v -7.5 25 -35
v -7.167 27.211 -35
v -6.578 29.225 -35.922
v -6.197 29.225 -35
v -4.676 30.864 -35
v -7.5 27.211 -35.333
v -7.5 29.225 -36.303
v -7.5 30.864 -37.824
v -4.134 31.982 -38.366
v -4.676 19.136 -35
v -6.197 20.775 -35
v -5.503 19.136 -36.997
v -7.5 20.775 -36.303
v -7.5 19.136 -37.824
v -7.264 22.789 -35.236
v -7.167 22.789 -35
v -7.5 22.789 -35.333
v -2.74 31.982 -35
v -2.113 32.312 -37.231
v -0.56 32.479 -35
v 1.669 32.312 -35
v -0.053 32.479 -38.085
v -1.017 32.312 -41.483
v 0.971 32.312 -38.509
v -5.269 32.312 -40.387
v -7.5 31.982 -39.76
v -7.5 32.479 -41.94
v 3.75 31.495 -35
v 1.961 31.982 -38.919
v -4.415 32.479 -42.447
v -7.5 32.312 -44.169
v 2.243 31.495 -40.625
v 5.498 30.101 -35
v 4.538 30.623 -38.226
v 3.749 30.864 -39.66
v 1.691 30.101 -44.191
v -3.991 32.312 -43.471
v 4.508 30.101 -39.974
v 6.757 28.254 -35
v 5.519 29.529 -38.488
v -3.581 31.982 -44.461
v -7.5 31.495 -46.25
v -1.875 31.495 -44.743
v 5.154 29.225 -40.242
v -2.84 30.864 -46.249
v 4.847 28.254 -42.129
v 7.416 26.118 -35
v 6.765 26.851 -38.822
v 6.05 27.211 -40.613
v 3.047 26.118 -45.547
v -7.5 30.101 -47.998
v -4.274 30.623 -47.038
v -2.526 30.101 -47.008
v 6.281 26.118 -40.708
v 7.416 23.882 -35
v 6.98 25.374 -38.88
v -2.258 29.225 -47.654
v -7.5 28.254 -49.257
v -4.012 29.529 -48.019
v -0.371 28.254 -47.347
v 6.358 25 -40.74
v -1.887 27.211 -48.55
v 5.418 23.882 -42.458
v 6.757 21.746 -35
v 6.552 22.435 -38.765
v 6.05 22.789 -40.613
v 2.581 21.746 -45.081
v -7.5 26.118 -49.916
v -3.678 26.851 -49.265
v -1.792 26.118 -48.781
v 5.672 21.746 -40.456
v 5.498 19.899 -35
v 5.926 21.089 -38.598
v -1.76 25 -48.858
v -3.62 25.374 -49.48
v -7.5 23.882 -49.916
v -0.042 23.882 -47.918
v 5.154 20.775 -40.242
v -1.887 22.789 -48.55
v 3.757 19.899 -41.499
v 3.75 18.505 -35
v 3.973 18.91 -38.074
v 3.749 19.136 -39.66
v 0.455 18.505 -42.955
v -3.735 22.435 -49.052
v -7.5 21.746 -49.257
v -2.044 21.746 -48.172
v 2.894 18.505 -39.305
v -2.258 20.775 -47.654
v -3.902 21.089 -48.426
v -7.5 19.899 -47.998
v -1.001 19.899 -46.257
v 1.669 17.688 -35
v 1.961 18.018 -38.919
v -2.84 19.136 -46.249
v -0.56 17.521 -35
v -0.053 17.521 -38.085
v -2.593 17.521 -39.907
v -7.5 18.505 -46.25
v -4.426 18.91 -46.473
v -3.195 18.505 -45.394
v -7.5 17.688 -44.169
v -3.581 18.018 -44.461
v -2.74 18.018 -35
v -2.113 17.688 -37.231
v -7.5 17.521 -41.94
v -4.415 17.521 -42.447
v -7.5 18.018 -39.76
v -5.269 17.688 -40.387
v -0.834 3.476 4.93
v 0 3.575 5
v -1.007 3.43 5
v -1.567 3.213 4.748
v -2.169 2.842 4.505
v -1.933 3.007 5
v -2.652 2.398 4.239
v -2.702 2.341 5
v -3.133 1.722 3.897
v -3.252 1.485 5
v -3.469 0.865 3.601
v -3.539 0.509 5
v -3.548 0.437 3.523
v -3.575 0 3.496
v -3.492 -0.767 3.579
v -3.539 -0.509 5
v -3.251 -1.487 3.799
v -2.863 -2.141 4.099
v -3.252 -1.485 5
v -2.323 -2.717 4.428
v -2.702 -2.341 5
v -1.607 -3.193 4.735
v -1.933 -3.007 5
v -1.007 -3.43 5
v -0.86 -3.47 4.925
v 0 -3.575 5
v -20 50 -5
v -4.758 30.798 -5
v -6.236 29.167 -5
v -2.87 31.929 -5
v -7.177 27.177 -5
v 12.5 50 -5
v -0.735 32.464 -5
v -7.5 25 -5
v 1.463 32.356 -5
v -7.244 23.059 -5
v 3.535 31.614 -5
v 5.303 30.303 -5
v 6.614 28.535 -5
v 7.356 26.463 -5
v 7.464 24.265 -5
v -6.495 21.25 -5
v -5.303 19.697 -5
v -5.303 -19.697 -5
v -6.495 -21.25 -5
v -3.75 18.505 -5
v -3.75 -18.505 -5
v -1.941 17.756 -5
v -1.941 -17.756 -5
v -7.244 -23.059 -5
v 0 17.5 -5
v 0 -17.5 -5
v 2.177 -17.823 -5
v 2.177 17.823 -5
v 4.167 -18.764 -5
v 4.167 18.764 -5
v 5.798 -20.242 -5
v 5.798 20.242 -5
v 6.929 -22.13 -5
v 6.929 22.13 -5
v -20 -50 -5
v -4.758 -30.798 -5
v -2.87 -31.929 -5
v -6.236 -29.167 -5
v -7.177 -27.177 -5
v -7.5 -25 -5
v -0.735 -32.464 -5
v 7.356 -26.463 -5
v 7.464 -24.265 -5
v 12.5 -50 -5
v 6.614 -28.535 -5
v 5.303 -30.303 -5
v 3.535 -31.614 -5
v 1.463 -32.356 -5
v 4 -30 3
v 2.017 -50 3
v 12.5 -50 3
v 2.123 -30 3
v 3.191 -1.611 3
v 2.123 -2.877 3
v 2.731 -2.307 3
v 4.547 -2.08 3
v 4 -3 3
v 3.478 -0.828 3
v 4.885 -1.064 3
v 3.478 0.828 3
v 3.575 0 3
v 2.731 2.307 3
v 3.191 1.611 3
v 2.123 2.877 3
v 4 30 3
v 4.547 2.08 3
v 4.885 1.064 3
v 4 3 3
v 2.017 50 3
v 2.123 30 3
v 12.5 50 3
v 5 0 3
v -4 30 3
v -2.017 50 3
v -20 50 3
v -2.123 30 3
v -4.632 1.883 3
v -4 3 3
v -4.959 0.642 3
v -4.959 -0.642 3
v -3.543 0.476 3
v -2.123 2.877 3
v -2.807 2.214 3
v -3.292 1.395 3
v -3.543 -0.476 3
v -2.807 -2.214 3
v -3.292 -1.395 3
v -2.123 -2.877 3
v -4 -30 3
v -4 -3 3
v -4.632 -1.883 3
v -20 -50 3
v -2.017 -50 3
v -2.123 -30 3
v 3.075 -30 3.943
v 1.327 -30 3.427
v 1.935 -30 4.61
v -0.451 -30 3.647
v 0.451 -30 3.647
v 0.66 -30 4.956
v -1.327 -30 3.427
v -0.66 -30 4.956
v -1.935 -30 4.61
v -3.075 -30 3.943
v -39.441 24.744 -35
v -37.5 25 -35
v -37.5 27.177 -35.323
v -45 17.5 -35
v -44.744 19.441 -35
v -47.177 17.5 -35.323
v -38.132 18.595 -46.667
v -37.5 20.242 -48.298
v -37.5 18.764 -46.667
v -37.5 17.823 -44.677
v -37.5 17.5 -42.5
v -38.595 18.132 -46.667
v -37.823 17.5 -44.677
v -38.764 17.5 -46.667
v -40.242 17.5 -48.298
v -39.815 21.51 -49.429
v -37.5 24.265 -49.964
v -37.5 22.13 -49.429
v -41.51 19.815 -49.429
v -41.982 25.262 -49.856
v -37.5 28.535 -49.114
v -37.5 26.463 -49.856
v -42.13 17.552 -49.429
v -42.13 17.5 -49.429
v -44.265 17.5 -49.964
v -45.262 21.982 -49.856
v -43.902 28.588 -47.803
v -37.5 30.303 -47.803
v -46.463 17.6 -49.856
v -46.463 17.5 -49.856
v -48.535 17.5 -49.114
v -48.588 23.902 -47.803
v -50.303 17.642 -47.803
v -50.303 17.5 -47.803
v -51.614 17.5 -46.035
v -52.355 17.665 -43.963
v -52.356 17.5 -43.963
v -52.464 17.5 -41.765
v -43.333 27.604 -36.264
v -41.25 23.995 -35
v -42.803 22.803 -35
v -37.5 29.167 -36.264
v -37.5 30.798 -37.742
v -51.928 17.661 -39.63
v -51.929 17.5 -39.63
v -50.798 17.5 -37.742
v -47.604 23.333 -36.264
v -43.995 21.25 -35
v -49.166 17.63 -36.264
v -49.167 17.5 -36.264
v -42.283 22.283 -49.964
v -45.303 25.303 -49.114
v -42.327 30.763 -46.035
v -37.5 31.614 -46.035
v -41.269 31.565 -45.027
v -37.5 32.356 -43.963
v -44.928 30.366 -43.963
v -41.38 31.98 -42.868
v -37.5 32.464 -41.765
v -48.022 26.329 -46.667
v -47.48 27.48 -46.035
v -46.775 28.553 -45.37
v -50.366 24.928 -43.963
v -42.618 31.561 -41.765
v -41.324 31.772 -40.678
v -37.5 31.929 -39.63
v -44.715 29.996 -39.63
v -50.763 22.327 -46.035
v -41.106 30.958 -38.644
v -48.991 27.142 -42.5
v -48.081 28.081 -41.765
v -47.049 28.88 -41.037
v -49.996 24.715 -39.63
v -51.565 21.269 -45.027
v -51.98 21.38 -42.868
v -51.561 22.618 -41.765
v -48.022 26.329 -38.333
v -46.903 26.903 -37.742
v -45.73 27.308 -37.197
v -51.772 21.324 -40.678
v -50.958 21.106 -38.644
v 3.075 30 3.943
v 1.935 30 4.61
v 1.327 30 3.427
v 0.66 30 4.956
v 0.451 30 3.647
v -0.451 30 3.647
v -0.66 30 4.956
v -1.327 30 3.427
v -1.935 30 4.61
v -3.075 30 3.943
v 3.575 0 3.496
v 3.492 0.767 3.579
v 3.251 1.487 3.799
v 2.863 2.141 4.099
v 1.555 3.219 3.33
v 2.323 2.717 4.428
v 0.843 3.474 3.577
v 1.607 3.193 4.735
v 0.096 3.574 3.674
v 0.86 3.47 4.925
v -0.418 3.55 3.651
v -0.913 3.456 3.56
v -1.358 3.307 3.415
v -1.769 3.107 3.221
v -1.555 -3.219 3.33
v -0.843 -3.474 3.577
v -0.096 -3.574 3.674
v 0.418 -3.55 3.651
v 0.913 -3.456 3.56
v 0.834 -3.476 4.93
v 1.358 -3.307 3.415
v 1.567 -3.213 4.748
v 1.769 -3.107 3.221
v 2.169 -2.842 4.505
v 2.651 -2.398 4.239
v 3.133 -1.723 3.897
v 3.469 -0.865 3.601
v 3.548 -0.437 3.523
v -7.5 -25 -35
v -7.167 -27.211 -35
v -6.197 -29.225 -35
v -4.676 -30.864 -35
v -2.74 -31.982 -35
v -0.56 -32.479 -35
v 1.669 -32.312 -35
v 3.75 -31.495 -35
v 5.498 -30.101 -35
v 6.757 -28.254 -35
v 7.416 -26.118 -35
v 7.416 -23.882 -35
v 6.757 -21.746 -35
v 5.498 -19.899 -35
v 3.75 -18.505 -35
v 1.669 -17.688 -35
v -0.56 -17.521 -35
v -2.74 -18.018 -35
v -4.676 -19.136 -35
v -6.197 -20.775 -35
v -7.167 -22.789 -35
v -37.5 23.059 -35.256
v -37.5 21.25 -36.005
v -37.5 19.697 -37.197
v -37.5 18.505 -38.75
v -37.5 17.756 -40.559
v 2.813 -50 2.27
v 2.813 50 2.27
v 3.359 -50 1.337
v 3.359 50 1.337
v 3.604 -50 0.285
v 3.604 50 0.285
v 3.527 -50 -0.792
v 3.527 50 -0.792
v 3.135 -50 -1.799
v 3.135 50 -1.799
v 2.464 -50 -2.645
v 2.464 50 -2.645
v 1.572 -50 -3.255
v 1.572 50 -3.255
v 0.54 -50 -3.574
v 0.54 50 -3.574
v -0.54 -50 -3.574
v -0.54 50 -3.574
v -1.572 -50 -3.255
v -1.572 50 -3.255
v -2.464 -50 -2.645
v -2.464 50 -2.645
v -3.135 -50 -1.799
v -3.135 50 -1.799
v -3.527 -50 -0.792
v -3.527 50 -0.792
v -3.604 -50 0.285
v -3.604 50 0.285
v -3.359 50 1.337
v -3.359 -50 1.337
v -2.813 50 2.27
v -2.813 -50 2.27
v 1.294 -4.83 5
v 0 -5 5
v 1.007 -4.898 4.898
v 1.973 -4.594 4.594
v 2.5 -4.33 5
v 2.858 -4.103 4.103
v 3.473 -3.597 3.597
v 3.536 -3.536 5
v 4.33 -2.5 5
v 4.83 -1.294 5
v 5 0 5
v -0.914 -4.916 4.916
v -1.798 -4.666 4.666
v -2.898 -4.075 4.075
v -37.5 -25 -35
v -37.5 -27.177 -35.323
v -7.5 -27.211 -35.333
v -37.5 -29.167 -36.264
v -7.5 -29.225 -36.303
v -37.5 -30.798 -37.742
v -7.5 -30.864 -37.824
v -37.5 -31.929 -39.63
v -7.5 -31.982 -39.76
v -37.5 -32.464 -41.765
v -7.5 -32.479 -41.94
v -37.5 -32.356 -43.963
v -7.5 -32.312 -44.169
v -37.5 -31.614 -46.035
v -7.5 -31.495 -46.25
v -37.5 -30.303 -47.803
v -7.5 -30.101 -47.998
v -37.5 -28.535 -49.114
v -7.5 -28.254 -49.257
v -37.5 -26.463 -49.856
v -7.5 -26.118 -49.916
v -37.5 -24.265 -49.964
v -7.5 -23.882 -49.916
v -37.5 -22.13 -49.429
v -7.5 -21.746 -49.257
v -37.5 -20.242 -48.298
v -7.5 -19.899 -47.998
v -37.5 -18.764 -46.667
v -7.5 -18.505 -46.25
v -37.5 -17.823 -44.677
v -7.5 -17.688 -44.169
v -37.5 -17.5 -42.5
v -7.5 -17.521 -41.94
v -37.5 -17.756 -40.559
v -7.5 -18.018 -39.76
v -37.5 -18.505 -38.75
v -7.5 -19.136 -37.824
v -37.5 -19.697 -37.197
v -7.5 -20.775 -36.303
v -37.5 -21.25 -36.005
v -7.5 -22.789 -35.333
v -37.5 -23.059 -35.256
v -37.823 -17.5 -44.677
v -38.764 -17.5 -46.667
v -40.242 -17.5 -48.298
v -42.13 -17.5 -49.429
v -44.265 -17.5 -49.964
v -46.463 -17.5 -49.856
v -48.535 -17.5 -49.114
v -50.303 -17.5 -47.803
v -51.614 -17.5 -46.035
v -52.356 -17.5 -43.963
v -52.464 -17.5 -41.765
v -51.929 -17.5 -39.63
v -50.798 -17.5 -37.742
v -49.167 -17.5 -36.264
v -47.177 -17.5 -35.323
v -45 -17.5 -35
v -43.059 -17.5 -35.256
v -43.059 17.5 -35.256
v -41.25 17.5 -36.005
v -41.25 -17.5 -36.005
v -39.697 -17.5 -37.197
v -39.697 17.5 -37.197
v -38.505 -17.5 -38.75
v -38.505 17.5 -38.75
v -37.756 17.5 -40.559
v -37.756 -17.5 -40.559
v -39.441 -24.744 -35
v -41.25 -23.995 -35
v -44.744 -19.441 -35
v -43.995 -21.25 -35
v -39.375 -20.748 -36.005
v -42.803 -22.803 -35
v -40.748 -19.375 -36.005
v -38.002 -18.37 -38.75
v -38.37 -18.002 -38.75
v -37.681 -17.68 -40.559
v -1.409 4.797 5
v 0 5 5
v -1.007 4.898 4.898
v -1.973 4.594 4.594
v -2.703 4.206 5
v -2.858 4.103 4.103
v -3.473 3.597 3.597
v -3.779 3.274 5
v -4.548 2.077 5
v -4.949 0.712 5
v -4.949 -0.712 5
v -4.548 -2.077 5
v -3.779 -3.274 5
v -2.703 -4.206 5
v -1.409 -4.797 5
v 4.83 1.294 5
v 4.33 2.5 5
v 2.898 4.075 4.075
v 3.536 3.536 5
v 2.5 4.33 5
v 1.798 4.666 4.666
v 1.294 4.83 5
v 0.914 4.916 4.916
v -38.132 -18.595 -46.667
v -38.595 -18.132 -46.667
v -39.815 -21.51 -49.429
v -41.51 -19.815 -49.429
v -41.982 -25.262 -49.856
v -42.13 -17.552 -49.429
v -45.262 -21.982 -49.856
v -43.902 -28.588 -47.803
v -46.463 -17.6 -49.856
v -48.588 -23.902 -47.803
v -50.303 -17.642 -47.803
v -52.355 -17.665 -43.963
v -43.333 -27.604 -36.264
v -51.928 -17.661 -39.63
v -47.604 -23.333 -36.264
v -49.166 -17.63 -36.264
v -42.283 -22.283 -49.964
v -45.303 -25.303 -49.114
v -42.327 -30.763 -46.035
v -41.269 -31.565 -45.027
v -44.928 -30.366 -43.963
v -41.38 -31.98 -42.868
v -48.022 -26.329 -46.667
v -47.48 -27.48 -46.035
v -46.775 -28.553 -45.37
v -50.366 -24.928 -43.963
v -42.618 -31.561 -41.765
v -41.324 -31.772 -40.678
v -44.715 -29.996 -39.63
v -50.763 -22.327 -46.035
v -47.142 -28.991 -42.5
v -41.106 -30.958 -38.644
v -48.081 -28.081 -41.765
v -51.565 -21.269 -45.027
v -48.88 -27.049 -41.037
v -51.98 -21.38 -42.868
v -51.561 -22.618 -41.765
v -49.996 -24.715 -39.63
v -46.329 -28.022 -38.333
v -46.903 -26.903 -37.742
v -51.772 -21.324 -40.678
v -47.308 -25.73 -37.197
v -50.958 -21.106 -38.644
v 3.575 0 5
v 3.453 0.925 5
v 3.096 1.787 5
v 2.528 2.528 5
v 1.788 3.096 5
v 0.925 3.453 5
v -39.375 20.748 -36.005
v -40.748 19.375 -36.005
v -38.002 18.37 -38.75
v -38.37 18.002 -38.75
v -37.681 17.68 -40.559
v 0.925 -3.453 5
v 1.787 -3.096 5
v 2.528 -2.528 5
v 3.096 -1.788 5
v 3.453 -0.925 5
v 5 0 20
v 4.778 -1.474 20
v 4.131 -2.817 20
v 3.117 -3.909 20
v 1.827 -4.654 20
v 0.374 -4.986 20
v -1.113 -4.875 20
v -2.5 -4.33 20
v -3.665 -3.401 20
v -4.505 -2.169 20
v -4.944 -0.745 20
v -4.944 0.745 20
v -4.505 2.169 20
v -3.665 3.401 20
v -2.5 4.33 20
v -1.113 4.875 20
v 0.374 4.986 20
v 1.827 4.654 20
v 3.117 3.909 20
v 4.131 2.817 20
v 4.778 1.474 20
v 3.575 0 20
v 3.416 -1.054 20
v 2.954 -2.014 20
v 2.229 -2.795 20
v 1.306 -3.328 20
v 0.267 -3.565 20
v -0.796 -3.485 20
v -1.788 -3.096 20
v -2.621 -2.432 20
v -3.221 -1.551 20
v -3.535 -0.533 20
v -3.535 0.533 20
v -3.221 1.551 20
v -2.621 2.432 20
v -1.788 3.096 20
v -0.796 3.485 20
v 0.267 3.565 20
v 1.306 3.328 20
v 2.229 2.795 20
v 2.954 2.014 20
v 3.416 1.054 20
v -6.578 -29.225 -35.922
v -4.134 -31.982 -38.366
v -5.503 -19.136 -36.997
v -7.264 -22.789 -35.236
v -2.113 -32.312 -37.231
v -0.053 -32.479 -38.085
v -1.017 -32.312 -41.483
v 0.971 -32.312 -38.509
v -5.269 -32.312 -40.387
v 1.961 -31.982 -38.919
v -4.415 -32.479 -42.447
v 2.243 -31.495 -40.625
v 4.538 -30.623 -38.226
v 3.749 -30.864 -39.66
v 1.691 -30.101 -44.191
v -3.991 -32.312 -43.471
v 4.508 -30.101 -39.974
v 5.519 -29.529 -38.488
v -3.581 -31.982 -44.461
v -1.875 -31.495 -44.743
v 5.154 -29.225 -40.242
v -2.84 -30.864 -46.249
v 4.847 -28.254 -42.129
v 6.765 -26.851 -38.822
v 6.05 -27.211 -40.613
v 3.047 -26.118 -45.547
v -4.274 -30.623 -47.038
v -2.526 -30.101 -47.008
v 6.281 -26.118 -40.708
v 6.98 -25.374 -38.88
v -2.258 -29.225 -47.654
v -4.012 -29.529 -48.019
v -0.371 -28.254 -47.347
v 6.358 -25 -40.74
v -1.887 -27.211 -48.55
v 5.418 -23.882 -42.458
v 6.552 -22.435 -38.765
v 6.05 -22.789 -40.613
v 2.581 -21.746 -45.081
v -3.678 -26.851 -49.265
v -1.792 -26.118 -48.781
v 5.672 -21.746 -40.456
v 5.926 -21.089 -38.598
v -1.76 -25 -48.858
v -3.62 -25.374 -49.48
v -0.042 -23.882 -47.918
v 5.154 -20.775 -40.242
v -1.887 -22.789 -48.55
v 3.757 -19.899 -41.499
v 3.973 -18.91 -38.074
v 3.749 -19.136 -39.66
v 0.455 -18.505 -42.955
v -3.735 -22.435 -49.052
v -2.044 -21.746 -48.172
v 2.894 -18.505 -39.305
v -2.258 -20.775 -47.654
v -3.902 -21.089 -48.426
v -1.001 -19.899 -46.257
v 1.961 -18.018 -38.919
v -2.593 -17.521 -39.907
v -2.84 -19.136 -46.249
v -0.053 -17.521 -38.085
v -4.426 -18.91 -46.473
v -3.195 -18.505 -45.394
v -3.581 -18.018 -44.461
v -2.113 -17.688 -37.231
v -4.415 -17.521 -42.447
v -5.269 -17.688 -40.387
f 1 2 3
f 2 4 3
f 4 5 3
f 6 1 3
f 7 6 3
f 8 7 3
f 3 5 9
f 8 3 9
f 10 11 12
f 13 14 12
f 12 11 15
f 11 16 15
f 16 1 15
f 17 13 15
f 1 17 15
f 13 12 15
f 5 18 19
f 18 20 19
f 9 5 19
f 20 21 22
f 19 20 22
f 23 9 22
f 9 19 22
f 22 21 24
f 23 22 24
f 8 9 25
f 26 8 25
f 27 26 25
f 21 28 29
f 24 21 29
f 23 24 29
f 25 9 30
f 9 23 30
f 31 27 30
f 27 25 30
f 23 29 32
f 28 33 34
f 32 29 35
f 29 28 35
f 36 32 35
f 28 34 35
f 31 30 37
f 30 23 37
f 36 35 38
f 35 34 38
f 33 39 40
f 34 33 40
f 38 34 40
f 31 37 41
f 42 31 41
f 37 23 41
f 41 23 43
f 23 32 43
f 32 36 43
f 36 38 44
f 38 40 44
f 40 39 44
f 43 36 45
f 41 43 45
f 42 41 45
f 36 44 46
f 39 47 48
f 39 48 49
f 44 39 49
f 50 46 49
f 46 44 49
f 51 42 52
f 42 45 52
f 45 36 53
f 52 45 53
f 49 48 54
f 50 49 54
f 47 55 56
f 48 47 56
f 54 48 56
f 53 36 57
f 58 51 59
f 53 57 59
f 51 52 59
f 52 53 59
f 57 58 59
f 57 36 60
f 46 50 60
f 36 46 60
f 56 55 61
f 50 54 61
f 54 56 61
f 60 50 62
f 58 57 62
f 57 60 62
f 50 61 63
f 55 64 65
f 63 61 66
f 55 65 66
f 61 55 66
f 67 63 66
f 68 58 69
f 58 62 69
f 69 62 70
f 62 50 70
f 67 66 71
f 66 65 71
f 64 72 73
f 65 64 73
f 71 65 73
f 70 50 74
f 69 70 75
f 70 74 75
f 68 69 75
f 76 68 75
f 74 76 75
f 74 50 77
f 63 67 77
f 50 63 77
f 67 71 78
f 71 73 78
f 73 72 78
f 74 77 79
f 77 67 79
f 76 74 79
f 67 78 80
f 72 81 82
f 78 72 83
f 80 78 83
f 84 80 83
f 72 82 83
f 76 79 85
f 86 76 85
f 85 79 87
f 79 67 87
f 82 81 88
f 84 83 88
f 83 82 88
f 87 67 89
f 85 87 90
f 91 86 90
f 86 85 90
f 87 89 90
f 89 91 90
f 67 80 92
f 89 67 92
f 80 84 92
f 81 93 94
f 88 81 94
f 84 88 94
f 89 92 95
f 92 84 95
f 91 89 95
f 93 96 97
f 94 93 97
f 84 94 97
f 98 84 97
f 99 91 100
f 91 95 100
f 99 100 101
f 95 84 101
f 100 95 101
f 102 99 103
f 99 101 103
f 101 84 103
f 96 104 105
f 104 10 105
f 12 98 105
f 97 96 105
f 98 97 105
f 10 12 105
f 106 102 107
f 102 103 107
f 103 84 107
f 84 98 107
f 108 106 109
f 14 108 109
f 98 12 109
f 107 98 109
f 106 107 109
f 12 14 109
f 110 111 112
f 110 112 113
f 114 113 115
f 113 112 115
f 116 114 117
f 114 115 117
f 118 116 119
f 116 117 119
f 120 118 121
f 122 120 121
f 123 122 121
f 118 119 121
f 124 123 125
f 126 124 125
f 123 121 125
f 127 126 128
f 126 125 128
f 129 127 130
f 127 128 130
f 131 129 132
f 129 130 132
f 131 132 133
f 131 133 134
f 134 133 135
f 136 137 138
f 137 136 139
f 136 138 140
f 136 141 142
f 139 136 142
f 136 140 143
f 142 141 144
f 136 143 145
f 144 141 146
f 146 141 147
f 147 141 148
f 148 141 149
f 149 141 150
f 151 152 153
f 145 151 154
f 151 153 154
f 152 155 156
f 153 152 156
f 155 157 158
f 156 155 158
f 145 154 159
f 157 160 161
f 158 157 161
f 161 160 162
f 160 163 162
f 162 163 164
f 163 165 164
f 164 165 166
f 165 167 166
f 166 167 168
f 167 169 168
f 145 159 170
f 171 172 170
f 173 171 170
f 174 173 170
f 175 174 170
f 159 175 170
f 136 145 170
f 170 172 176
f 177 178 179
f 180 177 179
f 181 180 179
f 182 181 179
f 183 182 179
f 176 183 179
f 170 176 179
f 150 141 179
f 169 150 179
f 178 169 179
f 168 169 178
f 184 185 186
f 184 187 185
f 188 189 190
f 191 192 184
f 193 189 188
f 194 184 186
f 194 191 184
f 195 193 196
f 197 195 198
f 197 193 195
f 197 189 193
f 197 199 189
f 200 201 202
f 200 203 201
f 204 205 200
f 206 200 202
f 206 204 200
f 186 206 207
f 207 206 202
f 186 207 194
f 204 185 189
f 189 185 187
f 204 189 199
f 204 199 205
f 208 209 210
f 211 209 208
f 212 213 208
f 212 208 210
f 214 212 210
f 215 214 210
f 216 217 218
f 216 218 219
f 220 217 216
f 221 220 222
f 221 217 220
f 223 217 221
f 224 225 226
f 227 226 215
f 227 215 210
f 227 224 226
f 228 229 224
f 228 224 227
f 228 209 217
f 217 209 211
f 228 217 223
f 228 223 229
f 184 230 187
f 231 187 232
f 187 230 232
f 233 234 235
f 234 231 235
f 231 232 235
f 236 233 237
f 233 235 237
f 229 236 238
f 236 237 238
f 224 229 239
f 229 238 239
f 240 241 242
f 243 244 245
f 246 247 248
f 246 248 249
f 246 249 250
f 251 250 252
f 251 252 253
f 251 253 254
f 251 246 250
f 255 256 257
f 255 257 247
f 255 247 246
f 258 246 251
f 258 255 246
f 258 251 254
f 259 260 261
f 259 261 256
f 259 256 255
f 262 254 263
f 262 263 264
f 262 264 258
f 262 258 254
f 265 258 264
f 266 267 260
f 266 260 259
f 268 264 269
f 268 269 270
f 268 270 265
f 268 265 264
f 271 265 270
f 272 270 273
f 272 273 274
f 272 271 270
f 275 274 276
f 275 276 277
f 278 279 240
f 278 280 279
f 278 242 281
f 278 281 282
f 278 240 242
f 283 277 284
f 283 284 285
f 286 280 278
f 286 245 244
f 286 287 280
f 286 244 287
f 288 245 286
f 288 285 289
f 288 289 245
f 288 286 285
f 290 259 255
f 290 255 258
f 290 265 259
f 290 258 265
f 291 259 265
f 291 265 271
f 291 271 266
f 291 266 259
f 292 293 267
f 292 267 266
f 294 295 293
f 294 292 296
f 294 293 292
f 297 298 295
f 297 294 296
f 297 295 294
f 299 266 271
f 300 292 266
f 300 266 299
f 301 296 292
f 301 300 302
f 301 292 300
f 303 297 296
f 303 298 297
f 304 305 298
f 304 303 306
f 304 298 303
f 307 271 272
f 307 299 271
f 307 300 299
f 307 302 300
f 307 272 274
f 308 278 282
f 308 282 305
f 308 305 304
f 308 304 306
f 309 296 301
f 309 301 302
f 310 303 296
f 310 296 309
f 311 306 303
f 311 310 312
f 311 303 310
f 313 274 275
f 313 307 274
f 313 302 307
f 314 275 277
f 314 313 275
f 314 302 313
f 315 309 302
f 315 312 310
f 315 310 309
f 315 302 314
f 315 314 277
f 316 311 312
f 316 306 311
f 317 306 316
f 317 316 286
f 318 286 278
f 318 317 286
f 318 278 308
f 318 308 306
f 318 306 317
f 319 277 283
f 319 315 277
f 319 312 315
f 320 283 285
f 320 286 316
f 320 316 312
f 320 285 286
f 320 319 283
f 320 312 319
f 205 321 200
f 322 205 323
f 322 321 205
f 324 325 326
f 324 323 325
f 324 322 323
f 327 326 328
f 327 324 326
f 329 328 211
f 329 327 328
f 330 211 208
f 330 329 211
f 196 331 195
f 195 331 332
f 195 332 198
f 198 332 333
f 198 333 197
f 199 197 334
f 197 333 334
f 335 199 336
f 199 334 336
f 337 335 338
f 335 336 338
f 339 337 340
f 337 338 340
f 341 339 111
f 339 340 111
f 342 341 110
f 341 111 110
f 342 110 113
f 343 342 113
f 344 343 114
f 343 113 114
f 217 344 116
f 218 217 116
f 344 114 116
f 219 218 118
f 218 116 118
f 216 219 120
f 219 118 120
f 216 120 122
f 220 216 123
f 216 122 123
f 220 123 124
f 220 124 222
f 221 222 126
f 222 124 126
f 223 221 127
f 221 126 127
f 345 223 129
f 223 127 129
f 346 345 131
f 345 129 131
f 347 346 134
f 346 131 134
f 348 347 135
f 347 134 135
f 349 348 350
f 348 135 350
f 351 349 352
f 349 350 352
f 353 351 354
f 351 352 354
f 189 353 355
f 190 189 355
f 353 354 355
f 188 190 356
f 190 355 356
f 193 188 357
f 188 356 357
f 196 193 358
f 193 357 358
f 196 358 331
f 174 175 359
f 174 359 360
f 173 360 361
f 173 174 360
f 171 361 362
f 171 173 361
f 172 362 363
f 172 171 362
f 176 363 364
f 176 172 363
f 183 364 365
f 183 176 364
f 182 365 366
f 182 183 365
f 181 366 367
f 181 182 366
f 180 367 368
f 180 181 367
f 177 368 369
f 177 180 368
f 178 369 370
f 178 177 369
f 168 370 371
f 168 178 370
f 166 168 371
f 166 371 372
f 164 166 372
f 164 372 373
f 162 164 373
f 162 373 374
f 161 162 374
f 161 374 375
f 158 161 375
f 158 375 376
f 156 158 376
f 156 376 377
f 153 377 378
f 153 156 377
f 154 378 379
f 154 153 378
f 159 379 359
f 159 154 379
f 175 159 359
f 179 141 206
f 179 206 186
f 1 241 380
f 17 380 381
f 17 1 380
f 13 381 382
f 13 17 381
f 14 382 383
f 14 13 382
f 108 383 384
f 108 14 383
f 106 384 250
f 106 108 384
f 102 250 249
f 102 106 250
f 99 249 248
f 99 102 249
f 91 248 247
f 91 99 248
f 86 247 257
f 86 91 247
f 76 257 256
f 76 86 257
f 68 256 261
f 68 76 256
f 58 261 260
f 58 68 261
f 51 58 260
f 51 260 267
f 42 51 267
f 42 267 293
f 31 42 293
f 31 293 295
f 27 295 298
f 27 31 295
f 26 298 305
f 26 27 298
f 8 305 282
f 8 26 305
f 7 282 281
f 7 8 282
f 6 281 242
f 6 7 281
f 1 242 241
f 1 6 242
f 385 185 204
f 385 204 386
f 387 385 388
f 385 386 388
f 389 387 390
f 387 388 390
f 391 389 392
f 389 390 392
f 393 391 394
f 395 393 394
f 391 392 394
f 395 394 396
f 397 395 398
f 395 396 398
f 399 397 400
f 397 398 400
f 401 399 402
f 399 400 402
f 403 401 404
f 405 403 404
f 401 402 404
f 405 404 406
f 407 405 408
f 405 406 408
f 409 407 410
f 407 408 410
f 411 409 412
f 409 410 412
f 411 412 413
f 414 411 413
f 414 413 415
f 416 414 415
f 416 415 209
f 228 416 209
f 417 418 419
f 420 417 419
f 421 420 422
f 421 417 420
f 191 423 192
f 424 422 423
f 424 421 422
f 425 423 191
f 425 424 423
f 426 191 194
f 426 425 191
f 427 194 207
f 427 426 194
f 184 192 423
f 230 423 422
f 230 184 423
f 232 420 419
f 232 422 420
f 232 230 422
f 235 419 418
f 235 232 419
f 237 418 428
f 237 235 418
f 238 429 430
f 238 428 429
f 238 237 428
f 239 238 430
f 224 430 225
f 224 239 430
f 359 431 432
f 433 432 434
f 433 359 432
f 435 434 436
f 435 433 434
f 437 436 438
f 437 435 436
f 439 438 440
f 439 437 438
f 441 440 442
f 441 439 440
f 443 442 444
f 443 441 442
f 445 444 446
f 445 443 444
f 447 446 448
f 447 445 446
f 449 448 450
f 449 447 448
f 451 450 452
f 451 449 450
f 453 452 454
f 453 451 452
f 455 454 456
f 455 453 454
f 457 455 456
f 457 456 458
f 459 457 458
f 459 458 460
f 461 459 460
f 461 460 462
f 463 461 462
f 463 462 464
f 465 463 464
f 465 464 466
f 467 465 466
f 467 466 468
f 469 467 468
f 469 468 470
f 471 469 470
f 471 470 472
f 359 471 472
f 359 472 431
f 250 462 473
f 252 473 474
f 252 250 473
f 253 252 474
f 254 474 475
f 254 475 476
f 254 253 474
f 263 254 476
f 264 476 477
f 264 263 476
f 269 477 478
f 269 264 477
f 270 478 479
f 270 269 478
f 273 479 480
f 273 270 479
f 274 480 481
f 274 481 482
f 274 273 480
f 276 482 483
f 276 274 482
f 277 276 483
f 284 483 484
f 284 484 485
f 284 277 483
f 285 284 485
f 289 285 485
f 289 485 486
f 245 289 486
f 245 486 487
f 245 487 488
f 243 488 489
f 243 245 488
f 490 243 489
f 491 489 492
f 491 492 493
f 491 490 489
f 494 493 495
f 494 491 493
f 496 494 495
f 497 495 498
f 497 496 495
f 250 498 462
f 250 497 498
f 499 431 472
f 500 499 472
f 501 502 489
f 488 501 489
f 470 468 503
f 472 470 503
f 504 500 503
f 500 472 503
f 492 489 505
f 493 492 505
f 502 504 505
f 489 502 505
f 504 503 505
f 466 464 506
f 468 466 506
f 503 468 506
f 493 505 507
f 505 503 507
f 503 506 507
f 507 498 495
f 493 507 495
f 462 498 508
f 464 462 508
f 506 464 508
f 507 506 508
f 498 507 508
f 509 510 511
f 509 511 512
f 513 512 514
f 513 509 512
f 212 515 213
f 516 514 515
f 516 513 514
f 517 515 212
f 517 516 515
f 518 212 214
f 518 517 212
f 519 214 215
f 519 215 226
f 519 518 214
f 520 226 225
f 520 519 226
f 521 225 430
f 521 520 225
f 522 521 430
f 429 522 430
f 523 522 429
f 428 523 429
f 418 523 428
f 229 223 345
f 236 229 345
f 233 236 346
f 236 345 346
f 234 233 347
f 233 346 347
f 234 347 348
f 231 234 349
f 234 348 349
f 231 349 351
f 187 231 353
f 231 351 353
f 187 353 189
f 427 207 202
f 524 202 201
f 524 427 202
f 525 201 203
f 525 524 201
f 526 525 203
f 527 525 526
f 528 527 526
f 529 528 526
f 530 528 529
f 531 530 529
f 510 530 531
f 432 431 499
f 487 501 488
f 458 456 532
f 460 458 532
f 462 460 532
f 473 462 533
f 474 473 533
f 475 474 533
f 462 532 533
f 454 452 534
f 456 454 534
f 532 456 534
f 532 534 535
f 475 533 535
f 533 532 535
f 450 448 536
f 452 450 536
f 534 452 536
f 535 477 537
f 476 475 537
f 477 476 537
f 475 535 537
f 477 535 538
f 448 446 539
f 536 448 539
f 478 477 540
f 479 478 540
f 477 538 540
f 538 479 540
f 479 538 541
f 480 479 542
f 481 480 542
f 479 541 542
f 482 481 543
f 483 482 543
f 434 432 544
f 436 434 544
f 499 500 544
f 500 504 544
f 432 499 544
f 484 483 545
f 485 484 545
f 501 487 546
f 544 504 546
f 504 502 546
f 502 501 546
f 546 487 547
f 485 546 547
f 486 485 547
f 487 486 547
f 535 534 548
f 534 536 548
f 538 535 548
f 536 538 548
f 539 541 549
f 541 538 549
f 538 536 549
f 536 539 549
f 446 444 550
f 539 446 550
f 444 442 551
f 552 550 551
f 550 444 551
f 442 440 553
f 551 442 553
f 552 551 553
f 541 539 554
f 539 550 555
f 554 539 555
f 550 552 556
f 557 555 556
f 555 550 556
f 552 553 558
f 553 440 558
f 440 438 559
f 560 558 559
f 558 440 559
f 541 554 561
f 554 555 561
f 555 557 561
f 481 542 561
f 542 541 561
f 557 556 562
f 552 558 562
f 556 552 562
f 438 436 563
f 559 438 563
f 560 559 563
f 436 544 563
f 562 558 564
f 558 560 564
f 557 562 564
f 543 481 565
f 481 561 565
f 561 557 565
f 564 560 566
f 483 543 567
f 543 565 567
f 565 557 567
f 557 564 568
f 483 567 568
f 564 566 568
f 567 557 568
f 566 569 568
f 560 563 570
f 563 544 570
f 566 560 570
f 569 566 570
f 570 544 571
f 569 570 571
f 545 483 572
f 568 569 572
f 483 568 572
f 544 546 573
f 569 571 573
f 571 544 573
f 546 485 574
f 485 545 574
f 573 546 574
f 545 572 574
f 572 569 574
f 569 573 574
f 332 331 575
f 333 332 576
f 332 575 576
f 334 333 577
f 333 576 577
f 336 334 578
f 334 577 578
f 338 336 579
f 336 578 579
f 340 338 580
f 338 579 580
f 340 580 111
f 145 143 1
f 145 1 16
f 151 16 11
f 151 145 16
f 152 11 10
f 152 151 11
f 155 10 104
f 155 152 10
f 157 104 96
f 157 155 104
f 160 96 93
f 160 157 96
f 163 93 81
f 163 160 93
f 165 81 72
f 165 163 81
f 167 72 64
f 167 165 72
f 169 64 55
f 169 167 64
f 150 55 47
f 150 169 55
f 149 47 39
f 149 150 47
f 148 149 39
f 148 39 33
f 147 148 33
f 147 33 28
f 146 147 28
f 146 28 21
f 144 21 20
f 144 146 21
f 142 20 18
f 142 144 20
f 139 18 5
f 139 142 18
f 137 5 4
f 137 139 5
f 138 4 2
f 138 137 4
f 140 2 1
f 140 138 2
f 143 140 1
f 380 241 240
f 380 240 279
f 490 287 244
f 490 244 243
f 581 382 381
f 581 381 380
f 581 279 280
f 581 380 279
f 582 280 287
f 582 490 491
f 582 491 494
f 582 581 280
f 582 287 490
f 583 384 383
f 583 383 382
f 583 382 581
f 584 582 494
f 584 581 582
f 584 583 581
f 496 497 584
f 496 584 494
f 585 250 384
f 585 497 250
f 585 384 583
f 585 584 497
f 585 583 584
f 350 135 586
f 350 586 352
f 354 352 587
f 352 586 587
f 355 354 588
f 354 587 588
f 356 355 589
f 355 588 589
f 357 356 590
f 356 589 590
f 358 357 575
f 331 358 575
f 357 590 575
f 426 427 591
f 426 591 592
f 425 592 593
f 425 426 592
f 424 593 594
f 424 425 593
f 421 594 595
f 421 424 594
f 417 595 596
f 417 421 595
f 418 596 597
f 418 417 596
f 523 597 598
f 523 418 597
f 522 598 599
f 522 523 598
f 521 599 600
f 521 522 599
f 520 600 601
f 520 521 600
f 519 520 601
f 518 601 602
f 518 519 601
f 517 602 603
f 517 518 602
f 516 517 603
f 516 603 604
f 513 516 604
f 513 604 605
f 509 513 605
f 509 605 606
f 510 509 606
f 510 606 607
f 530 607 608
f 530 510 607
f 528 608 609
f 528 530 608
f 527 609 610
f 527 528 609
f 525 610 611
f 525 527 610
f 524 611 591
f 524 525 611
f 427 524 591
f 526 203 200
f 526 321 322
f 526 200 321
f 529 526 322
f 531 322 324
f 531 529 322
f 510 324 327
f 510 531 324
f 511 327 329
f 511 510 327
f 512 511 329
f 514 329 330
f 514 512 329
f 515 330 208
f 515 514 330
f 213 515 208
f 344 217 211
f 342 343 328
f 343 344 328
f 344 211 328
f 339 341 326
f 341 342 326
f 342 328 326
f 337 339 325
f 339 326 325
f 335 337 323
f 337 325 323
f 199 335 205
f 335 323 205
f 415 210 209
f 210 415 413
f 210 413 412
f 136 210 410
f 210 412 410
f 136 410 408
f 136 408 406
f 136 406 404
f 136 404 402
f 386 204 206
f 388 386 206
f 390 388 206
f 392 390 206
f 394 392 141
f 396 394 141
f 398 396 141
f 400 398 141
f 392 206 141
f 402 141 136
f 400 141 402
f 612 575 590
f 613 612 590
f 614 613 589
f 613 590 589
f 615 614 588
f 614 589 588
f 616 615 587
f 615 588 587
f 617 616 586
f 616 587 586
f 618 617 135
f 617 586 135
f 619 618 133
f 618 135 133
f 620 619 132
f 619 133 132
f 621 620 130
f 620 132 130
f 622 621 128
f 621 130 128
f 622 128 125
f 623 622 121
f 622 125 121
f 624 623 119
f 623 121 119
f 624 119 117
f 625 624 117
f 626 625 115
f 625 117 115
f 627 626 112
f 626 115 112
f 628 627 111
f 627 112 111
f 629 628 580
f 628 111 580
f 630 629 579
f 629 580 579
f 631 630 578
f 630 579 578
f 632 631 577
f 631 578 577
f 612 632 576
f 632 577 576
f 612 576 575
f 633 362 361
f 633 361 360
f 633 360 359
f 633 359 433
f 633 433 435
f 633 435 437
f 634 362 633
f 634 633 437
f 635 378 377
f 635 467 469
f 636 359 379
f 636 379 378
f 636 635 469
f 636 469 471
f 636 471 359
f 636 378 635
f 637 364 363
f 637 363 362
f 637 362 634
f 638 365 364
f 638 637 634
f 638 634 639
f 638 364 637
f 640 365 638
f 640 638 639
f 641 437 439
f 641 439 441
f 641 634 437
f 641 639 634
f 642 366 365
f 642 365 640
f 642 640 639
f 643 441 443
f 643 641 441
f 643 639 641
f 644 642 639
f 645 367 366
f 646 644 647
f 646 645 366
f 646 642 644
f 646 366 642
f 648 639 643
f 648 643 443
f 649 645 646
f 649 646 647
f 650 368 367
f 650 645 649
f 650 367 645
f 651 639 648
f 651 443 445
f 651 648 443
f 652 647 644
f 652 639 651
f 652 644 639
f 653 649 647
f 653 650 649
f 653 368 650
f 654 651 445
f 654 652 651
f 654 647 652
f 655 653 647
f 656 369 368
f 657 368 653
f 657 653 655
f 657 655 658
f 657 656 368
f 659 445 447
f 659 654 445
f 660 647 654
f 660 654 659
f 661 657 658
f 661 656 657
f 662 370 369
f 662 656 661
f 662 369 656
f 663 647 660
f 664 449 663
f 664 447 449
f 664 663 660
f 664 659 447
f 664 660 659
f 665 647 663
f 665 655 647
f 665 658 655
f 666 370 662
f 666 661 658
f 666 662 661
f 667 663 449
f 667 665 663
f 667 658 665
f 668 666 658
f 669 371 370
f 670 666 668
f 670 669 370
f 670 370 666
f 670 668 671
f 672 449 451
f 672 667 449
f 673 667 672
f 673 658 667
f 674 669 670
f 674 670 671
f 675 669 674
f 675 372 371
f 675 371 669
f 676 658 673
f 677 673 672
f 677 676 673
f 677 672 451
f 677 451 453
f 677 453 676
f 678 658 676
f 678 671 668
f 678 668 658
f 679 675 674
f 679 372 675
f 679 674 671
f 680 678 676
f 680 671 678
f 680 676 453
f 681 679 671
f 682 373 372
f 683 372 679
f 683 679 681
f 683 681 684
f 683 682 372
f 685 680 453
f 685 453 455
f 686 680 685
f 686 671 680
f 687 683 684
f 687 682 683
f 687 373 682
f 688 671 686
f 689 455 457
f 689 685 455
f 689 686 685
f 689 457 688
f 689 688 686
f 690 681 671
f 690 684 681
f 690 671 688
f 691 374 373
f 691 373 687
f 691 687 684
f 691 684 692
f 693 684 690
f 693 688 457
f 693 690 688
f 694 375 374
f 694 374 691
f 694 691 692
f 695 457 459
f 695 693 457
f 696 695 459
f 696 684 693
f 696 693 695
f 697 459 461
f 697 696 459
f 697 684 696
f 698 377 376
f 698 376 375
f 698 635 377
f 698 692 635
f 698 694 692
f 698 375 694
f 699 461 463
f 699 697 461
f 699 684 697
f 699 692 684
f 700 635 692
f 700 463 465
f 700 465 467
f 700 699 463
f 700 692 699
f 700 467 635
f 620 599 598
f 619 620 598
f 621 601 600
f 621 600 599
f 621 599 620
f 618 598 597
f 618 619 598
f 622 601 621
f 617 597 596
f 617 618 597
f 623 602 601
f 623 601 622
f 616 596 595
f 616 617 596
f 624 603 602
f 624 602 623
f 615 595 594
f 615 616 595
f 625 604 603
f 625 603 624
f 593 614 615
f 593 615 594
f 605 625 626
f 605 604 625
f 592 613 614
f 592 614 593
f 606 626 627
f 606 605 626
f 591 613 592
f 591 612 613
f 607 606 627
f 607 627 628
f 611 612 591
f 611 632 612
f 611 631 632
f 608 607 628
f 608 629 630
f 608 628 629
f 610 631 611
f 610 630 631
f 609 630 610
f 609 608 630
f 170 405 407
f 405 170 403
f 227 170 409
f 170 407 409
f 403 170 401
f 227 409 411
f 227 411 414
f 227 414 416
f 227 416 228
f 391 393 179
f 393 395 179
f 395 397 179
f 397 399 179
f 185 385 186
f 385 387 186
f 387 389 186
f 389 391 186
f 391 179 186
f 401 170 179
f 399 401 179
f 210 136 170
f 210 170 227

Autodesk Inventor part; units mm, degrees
ref_plane "YZ Plane" through (0, 0, 0) normal (1, 0, 0) x (0, 1, 0)
ref_plane "XZ Plane" through (0, 0, 0) normal (0, 1, 0) x (-1, 0, 0)
sketch "Sketch1" plane through (0, 0, 0) normal (0, 1, 0) x (-1, 0, 0)
  circle A0 centre (0, 0) radius 3.575
  circle A1 centre (0, 0) radius 5
  dimension "d0" = 7.15
  dimension "d1" = 10
extrude "Extrusion1" add sketch "Sketch1" along normal mid plane 60
ref_plane "Work Plane1" through (0, 0, 5) normal (0, 0, 1) x (1, 0, 0)
sketch "Sketch2" plane through (0, 0, 5) normal (0, 0, 1) x (1, 0, 0)
  circle A0 centre (0, 0) radius 3.575
  circle A1 centre (0, 0) radius 5
  line L0 (5, 30) -> (-5, 30) projected
  dimension "d4" = 7.15
  dimension "d5" = 10
  dimension "d22" = 0
extrude "Extrusion2" add sketch "Sketch2" along normal blind 15 and the other way blind 5
sketch "Sketch3" plane through (0, 0, 20) normal (0, 0, 1) x (1, 0, 0)
  circle A0 centre (0, 0) radius 3.575
extrude "Extrusion3" cut sketch "Sketch3" against normal up to surface
sketch "Sketch4" plane through (0, 30, 0) normal (0, 1, 0) x (1, 0, 0)
  circle A0 centre (0, 0) radius 3.675
  dimension "d13" = 7.35
extrude "Extrusion4" cut sketch "Sketch4" against normal through all
ref_plane "Work Plane3" through (0, 0, -5) normal (0, 0, 1) x (1, 0, 0)
sketch "Sketch6" plane through (0, 0, -5) normal (0, 0, 1) x (1, 0, 0)
  line L0 (12.5, -50) -> (-12.5, -50)
  line L1 (-12.5, -50) -> (-12.5, 50)
  line L2 (-12.5, 50) -> (12.5, 50)
  line L3 (12.5, 50) -> (12.5, -50)
  line L4 (12.5, -50) -> (-12.5, 50) construction
  line L5 (-12.5, -50) -> (12.5, 50) construction
  point P0 (0, 0)
  dimension "d23" = 25
  dimension "d24" = 100
extrude "Extrusion6" add sketch "Sketch6" along normal blind 8
sketch "Sketch7" plane through (0, -30, 0) normal (0, -1, 0) x (1, 0, 0)
  circle A0 centre (0, 0) radius 3.615
  dimension "d27" = 7.23
extrude "Extrusion7" cut sketch "Sketch7" along normal through all both and the other way through all
sketch "Sketch8" plane through (0, 0, -5) normal (0, 0, -1) x (-1, 0, 0)
  circle A0 centre (0, -25) radius 7.5
  circle A1 centre (0, 25) radius 7.5
  point P0 (0, 0)
  dimension "d30" = 15
  dimension "d31" = 15
  dimension "d32" = 50
  dimension "d33" = 25
extrude "Extrusion8" add sketch "Sketch8" along normal blind 30
sketch "Sketch9" plane through (0, 25, -35) normal (0, 0, -1) x (-1, 0, 0)
  circle A0 centre (0, 0) radius 7.5
  line L0 (7.5, 0) -> (7.5, -9.7245)
  line L1 (7.5, -9.7245) -> (7.5, 12.7829)
  point P0 (0, -25)
revolve "Revolution1" add sketch "Sketch9" angle 90 about axis through (-7.5, 15.2755, -35) along (0, 1, 0)
mirror "Mirror1" about plane through (0, 0, 0) normal (0, 1, 0) of "Revolution1"
sketch "Sketch10" plane through (-7.5, 25, -42.5) normal (-1, 0, 0) x (0, 0, 1)
  circle A0 centre (0, 0) radius 7.5
  point P0 (42.5, -25)
  dimension "d37" = 15
extrude "Extrusion9" add sketch "Sketch10" along normal blind 30
mirror "Mirror2" about plane through (0, 0, 0) normal (0, 1, 0) of "Extrusion9"
sketch "Sketch11" plane through (-37.5, 25, -42.5) normal (-1, 0, 0) x (0, 0, 1)
  circle A0 centre (0, 0) radius 7.5
  circle A1 centre (0, 0) radius 7.5 projected
  line L0 (0, -7.5) -> (-9.6615, -7.5)
  line L1 (-9.6615, -7.5) -> (9.5932, -7.5)
  point P0 (42.5, -25)
  dimension "d40" = 15
sketch "Sketch12" plane through (-37.5, -25, -42.5) normal (-1, 0, 0) x (0, 0, 1)
  circle A0 centre (0, 0) radius 7.5
  line L0 (0, 7.5) -> (-6.8839, 7.5)
  circle A1 centre (0, 0) radius 7.5 projected
  line L1 (-6.8839, 7.5) -> (7.5, 7.5)
  point P0 (42.5, 25)
  dimension "d41" = 15
revolve "Revolution2" add sketch "Sketch12" angle 90 about axis through (-37.5, -17.5, -49.3839) along (0, 0, -1)
mirror "Mirror3" about plane through (0, 0, 0) normal (0, 1, 0) of "Revolution2"
sketch "Sketch13" plane through (-45, 17.5, -42.5) normal (0, -1, 0) x (1, 0, 0)
  circle A0 centre (0, 0) radius 7.5
  point P0 (45, 42.5)
  dimension "d43" = 15
extrude "Extrusion10" add sketch "Sketch13" along normal up to surface (35 mm away)
sketch "Sketch14" plane through (-12.5, -50, -5) normal (-1, 0, 0) x (0, 0, 1)
  line L0 (0, 100) -> (0, 0) projected
  line L1 (8, 100) -> (8, 0) projected
  line L2 (0, 0) -> (8, 0)
  line L3 (8, 0) -> (8, 100)
  line L4 (8, 100) -> (0, 100)
  line L5 (0, 100) -> (0, 0)
  point P0 (5, 50)
extrude "Extrusion11" add sketch "Sketch14" along normal blind 7.5
sketch "Sketch5" plane through (0, 0, -5) normal (0, 0, 1) x (1, 0, 0)
  line L0 (5, 15) -> (-5, 15) projected
  line L1 (-5, -15) -> (5, -15) projected
  line L2 (2, 15) -> (-2, 15)
  line L3 (-2, 15) -> (-2, -15)
  line L4 (-2, -15) -> (2, -15)
  line L5 (2, -15) -> (2, 15)
  point P0 (0, 0)
  dimension "d16" = 4
  dimension "d17" = 2
properties part number "T-joint_hand"
